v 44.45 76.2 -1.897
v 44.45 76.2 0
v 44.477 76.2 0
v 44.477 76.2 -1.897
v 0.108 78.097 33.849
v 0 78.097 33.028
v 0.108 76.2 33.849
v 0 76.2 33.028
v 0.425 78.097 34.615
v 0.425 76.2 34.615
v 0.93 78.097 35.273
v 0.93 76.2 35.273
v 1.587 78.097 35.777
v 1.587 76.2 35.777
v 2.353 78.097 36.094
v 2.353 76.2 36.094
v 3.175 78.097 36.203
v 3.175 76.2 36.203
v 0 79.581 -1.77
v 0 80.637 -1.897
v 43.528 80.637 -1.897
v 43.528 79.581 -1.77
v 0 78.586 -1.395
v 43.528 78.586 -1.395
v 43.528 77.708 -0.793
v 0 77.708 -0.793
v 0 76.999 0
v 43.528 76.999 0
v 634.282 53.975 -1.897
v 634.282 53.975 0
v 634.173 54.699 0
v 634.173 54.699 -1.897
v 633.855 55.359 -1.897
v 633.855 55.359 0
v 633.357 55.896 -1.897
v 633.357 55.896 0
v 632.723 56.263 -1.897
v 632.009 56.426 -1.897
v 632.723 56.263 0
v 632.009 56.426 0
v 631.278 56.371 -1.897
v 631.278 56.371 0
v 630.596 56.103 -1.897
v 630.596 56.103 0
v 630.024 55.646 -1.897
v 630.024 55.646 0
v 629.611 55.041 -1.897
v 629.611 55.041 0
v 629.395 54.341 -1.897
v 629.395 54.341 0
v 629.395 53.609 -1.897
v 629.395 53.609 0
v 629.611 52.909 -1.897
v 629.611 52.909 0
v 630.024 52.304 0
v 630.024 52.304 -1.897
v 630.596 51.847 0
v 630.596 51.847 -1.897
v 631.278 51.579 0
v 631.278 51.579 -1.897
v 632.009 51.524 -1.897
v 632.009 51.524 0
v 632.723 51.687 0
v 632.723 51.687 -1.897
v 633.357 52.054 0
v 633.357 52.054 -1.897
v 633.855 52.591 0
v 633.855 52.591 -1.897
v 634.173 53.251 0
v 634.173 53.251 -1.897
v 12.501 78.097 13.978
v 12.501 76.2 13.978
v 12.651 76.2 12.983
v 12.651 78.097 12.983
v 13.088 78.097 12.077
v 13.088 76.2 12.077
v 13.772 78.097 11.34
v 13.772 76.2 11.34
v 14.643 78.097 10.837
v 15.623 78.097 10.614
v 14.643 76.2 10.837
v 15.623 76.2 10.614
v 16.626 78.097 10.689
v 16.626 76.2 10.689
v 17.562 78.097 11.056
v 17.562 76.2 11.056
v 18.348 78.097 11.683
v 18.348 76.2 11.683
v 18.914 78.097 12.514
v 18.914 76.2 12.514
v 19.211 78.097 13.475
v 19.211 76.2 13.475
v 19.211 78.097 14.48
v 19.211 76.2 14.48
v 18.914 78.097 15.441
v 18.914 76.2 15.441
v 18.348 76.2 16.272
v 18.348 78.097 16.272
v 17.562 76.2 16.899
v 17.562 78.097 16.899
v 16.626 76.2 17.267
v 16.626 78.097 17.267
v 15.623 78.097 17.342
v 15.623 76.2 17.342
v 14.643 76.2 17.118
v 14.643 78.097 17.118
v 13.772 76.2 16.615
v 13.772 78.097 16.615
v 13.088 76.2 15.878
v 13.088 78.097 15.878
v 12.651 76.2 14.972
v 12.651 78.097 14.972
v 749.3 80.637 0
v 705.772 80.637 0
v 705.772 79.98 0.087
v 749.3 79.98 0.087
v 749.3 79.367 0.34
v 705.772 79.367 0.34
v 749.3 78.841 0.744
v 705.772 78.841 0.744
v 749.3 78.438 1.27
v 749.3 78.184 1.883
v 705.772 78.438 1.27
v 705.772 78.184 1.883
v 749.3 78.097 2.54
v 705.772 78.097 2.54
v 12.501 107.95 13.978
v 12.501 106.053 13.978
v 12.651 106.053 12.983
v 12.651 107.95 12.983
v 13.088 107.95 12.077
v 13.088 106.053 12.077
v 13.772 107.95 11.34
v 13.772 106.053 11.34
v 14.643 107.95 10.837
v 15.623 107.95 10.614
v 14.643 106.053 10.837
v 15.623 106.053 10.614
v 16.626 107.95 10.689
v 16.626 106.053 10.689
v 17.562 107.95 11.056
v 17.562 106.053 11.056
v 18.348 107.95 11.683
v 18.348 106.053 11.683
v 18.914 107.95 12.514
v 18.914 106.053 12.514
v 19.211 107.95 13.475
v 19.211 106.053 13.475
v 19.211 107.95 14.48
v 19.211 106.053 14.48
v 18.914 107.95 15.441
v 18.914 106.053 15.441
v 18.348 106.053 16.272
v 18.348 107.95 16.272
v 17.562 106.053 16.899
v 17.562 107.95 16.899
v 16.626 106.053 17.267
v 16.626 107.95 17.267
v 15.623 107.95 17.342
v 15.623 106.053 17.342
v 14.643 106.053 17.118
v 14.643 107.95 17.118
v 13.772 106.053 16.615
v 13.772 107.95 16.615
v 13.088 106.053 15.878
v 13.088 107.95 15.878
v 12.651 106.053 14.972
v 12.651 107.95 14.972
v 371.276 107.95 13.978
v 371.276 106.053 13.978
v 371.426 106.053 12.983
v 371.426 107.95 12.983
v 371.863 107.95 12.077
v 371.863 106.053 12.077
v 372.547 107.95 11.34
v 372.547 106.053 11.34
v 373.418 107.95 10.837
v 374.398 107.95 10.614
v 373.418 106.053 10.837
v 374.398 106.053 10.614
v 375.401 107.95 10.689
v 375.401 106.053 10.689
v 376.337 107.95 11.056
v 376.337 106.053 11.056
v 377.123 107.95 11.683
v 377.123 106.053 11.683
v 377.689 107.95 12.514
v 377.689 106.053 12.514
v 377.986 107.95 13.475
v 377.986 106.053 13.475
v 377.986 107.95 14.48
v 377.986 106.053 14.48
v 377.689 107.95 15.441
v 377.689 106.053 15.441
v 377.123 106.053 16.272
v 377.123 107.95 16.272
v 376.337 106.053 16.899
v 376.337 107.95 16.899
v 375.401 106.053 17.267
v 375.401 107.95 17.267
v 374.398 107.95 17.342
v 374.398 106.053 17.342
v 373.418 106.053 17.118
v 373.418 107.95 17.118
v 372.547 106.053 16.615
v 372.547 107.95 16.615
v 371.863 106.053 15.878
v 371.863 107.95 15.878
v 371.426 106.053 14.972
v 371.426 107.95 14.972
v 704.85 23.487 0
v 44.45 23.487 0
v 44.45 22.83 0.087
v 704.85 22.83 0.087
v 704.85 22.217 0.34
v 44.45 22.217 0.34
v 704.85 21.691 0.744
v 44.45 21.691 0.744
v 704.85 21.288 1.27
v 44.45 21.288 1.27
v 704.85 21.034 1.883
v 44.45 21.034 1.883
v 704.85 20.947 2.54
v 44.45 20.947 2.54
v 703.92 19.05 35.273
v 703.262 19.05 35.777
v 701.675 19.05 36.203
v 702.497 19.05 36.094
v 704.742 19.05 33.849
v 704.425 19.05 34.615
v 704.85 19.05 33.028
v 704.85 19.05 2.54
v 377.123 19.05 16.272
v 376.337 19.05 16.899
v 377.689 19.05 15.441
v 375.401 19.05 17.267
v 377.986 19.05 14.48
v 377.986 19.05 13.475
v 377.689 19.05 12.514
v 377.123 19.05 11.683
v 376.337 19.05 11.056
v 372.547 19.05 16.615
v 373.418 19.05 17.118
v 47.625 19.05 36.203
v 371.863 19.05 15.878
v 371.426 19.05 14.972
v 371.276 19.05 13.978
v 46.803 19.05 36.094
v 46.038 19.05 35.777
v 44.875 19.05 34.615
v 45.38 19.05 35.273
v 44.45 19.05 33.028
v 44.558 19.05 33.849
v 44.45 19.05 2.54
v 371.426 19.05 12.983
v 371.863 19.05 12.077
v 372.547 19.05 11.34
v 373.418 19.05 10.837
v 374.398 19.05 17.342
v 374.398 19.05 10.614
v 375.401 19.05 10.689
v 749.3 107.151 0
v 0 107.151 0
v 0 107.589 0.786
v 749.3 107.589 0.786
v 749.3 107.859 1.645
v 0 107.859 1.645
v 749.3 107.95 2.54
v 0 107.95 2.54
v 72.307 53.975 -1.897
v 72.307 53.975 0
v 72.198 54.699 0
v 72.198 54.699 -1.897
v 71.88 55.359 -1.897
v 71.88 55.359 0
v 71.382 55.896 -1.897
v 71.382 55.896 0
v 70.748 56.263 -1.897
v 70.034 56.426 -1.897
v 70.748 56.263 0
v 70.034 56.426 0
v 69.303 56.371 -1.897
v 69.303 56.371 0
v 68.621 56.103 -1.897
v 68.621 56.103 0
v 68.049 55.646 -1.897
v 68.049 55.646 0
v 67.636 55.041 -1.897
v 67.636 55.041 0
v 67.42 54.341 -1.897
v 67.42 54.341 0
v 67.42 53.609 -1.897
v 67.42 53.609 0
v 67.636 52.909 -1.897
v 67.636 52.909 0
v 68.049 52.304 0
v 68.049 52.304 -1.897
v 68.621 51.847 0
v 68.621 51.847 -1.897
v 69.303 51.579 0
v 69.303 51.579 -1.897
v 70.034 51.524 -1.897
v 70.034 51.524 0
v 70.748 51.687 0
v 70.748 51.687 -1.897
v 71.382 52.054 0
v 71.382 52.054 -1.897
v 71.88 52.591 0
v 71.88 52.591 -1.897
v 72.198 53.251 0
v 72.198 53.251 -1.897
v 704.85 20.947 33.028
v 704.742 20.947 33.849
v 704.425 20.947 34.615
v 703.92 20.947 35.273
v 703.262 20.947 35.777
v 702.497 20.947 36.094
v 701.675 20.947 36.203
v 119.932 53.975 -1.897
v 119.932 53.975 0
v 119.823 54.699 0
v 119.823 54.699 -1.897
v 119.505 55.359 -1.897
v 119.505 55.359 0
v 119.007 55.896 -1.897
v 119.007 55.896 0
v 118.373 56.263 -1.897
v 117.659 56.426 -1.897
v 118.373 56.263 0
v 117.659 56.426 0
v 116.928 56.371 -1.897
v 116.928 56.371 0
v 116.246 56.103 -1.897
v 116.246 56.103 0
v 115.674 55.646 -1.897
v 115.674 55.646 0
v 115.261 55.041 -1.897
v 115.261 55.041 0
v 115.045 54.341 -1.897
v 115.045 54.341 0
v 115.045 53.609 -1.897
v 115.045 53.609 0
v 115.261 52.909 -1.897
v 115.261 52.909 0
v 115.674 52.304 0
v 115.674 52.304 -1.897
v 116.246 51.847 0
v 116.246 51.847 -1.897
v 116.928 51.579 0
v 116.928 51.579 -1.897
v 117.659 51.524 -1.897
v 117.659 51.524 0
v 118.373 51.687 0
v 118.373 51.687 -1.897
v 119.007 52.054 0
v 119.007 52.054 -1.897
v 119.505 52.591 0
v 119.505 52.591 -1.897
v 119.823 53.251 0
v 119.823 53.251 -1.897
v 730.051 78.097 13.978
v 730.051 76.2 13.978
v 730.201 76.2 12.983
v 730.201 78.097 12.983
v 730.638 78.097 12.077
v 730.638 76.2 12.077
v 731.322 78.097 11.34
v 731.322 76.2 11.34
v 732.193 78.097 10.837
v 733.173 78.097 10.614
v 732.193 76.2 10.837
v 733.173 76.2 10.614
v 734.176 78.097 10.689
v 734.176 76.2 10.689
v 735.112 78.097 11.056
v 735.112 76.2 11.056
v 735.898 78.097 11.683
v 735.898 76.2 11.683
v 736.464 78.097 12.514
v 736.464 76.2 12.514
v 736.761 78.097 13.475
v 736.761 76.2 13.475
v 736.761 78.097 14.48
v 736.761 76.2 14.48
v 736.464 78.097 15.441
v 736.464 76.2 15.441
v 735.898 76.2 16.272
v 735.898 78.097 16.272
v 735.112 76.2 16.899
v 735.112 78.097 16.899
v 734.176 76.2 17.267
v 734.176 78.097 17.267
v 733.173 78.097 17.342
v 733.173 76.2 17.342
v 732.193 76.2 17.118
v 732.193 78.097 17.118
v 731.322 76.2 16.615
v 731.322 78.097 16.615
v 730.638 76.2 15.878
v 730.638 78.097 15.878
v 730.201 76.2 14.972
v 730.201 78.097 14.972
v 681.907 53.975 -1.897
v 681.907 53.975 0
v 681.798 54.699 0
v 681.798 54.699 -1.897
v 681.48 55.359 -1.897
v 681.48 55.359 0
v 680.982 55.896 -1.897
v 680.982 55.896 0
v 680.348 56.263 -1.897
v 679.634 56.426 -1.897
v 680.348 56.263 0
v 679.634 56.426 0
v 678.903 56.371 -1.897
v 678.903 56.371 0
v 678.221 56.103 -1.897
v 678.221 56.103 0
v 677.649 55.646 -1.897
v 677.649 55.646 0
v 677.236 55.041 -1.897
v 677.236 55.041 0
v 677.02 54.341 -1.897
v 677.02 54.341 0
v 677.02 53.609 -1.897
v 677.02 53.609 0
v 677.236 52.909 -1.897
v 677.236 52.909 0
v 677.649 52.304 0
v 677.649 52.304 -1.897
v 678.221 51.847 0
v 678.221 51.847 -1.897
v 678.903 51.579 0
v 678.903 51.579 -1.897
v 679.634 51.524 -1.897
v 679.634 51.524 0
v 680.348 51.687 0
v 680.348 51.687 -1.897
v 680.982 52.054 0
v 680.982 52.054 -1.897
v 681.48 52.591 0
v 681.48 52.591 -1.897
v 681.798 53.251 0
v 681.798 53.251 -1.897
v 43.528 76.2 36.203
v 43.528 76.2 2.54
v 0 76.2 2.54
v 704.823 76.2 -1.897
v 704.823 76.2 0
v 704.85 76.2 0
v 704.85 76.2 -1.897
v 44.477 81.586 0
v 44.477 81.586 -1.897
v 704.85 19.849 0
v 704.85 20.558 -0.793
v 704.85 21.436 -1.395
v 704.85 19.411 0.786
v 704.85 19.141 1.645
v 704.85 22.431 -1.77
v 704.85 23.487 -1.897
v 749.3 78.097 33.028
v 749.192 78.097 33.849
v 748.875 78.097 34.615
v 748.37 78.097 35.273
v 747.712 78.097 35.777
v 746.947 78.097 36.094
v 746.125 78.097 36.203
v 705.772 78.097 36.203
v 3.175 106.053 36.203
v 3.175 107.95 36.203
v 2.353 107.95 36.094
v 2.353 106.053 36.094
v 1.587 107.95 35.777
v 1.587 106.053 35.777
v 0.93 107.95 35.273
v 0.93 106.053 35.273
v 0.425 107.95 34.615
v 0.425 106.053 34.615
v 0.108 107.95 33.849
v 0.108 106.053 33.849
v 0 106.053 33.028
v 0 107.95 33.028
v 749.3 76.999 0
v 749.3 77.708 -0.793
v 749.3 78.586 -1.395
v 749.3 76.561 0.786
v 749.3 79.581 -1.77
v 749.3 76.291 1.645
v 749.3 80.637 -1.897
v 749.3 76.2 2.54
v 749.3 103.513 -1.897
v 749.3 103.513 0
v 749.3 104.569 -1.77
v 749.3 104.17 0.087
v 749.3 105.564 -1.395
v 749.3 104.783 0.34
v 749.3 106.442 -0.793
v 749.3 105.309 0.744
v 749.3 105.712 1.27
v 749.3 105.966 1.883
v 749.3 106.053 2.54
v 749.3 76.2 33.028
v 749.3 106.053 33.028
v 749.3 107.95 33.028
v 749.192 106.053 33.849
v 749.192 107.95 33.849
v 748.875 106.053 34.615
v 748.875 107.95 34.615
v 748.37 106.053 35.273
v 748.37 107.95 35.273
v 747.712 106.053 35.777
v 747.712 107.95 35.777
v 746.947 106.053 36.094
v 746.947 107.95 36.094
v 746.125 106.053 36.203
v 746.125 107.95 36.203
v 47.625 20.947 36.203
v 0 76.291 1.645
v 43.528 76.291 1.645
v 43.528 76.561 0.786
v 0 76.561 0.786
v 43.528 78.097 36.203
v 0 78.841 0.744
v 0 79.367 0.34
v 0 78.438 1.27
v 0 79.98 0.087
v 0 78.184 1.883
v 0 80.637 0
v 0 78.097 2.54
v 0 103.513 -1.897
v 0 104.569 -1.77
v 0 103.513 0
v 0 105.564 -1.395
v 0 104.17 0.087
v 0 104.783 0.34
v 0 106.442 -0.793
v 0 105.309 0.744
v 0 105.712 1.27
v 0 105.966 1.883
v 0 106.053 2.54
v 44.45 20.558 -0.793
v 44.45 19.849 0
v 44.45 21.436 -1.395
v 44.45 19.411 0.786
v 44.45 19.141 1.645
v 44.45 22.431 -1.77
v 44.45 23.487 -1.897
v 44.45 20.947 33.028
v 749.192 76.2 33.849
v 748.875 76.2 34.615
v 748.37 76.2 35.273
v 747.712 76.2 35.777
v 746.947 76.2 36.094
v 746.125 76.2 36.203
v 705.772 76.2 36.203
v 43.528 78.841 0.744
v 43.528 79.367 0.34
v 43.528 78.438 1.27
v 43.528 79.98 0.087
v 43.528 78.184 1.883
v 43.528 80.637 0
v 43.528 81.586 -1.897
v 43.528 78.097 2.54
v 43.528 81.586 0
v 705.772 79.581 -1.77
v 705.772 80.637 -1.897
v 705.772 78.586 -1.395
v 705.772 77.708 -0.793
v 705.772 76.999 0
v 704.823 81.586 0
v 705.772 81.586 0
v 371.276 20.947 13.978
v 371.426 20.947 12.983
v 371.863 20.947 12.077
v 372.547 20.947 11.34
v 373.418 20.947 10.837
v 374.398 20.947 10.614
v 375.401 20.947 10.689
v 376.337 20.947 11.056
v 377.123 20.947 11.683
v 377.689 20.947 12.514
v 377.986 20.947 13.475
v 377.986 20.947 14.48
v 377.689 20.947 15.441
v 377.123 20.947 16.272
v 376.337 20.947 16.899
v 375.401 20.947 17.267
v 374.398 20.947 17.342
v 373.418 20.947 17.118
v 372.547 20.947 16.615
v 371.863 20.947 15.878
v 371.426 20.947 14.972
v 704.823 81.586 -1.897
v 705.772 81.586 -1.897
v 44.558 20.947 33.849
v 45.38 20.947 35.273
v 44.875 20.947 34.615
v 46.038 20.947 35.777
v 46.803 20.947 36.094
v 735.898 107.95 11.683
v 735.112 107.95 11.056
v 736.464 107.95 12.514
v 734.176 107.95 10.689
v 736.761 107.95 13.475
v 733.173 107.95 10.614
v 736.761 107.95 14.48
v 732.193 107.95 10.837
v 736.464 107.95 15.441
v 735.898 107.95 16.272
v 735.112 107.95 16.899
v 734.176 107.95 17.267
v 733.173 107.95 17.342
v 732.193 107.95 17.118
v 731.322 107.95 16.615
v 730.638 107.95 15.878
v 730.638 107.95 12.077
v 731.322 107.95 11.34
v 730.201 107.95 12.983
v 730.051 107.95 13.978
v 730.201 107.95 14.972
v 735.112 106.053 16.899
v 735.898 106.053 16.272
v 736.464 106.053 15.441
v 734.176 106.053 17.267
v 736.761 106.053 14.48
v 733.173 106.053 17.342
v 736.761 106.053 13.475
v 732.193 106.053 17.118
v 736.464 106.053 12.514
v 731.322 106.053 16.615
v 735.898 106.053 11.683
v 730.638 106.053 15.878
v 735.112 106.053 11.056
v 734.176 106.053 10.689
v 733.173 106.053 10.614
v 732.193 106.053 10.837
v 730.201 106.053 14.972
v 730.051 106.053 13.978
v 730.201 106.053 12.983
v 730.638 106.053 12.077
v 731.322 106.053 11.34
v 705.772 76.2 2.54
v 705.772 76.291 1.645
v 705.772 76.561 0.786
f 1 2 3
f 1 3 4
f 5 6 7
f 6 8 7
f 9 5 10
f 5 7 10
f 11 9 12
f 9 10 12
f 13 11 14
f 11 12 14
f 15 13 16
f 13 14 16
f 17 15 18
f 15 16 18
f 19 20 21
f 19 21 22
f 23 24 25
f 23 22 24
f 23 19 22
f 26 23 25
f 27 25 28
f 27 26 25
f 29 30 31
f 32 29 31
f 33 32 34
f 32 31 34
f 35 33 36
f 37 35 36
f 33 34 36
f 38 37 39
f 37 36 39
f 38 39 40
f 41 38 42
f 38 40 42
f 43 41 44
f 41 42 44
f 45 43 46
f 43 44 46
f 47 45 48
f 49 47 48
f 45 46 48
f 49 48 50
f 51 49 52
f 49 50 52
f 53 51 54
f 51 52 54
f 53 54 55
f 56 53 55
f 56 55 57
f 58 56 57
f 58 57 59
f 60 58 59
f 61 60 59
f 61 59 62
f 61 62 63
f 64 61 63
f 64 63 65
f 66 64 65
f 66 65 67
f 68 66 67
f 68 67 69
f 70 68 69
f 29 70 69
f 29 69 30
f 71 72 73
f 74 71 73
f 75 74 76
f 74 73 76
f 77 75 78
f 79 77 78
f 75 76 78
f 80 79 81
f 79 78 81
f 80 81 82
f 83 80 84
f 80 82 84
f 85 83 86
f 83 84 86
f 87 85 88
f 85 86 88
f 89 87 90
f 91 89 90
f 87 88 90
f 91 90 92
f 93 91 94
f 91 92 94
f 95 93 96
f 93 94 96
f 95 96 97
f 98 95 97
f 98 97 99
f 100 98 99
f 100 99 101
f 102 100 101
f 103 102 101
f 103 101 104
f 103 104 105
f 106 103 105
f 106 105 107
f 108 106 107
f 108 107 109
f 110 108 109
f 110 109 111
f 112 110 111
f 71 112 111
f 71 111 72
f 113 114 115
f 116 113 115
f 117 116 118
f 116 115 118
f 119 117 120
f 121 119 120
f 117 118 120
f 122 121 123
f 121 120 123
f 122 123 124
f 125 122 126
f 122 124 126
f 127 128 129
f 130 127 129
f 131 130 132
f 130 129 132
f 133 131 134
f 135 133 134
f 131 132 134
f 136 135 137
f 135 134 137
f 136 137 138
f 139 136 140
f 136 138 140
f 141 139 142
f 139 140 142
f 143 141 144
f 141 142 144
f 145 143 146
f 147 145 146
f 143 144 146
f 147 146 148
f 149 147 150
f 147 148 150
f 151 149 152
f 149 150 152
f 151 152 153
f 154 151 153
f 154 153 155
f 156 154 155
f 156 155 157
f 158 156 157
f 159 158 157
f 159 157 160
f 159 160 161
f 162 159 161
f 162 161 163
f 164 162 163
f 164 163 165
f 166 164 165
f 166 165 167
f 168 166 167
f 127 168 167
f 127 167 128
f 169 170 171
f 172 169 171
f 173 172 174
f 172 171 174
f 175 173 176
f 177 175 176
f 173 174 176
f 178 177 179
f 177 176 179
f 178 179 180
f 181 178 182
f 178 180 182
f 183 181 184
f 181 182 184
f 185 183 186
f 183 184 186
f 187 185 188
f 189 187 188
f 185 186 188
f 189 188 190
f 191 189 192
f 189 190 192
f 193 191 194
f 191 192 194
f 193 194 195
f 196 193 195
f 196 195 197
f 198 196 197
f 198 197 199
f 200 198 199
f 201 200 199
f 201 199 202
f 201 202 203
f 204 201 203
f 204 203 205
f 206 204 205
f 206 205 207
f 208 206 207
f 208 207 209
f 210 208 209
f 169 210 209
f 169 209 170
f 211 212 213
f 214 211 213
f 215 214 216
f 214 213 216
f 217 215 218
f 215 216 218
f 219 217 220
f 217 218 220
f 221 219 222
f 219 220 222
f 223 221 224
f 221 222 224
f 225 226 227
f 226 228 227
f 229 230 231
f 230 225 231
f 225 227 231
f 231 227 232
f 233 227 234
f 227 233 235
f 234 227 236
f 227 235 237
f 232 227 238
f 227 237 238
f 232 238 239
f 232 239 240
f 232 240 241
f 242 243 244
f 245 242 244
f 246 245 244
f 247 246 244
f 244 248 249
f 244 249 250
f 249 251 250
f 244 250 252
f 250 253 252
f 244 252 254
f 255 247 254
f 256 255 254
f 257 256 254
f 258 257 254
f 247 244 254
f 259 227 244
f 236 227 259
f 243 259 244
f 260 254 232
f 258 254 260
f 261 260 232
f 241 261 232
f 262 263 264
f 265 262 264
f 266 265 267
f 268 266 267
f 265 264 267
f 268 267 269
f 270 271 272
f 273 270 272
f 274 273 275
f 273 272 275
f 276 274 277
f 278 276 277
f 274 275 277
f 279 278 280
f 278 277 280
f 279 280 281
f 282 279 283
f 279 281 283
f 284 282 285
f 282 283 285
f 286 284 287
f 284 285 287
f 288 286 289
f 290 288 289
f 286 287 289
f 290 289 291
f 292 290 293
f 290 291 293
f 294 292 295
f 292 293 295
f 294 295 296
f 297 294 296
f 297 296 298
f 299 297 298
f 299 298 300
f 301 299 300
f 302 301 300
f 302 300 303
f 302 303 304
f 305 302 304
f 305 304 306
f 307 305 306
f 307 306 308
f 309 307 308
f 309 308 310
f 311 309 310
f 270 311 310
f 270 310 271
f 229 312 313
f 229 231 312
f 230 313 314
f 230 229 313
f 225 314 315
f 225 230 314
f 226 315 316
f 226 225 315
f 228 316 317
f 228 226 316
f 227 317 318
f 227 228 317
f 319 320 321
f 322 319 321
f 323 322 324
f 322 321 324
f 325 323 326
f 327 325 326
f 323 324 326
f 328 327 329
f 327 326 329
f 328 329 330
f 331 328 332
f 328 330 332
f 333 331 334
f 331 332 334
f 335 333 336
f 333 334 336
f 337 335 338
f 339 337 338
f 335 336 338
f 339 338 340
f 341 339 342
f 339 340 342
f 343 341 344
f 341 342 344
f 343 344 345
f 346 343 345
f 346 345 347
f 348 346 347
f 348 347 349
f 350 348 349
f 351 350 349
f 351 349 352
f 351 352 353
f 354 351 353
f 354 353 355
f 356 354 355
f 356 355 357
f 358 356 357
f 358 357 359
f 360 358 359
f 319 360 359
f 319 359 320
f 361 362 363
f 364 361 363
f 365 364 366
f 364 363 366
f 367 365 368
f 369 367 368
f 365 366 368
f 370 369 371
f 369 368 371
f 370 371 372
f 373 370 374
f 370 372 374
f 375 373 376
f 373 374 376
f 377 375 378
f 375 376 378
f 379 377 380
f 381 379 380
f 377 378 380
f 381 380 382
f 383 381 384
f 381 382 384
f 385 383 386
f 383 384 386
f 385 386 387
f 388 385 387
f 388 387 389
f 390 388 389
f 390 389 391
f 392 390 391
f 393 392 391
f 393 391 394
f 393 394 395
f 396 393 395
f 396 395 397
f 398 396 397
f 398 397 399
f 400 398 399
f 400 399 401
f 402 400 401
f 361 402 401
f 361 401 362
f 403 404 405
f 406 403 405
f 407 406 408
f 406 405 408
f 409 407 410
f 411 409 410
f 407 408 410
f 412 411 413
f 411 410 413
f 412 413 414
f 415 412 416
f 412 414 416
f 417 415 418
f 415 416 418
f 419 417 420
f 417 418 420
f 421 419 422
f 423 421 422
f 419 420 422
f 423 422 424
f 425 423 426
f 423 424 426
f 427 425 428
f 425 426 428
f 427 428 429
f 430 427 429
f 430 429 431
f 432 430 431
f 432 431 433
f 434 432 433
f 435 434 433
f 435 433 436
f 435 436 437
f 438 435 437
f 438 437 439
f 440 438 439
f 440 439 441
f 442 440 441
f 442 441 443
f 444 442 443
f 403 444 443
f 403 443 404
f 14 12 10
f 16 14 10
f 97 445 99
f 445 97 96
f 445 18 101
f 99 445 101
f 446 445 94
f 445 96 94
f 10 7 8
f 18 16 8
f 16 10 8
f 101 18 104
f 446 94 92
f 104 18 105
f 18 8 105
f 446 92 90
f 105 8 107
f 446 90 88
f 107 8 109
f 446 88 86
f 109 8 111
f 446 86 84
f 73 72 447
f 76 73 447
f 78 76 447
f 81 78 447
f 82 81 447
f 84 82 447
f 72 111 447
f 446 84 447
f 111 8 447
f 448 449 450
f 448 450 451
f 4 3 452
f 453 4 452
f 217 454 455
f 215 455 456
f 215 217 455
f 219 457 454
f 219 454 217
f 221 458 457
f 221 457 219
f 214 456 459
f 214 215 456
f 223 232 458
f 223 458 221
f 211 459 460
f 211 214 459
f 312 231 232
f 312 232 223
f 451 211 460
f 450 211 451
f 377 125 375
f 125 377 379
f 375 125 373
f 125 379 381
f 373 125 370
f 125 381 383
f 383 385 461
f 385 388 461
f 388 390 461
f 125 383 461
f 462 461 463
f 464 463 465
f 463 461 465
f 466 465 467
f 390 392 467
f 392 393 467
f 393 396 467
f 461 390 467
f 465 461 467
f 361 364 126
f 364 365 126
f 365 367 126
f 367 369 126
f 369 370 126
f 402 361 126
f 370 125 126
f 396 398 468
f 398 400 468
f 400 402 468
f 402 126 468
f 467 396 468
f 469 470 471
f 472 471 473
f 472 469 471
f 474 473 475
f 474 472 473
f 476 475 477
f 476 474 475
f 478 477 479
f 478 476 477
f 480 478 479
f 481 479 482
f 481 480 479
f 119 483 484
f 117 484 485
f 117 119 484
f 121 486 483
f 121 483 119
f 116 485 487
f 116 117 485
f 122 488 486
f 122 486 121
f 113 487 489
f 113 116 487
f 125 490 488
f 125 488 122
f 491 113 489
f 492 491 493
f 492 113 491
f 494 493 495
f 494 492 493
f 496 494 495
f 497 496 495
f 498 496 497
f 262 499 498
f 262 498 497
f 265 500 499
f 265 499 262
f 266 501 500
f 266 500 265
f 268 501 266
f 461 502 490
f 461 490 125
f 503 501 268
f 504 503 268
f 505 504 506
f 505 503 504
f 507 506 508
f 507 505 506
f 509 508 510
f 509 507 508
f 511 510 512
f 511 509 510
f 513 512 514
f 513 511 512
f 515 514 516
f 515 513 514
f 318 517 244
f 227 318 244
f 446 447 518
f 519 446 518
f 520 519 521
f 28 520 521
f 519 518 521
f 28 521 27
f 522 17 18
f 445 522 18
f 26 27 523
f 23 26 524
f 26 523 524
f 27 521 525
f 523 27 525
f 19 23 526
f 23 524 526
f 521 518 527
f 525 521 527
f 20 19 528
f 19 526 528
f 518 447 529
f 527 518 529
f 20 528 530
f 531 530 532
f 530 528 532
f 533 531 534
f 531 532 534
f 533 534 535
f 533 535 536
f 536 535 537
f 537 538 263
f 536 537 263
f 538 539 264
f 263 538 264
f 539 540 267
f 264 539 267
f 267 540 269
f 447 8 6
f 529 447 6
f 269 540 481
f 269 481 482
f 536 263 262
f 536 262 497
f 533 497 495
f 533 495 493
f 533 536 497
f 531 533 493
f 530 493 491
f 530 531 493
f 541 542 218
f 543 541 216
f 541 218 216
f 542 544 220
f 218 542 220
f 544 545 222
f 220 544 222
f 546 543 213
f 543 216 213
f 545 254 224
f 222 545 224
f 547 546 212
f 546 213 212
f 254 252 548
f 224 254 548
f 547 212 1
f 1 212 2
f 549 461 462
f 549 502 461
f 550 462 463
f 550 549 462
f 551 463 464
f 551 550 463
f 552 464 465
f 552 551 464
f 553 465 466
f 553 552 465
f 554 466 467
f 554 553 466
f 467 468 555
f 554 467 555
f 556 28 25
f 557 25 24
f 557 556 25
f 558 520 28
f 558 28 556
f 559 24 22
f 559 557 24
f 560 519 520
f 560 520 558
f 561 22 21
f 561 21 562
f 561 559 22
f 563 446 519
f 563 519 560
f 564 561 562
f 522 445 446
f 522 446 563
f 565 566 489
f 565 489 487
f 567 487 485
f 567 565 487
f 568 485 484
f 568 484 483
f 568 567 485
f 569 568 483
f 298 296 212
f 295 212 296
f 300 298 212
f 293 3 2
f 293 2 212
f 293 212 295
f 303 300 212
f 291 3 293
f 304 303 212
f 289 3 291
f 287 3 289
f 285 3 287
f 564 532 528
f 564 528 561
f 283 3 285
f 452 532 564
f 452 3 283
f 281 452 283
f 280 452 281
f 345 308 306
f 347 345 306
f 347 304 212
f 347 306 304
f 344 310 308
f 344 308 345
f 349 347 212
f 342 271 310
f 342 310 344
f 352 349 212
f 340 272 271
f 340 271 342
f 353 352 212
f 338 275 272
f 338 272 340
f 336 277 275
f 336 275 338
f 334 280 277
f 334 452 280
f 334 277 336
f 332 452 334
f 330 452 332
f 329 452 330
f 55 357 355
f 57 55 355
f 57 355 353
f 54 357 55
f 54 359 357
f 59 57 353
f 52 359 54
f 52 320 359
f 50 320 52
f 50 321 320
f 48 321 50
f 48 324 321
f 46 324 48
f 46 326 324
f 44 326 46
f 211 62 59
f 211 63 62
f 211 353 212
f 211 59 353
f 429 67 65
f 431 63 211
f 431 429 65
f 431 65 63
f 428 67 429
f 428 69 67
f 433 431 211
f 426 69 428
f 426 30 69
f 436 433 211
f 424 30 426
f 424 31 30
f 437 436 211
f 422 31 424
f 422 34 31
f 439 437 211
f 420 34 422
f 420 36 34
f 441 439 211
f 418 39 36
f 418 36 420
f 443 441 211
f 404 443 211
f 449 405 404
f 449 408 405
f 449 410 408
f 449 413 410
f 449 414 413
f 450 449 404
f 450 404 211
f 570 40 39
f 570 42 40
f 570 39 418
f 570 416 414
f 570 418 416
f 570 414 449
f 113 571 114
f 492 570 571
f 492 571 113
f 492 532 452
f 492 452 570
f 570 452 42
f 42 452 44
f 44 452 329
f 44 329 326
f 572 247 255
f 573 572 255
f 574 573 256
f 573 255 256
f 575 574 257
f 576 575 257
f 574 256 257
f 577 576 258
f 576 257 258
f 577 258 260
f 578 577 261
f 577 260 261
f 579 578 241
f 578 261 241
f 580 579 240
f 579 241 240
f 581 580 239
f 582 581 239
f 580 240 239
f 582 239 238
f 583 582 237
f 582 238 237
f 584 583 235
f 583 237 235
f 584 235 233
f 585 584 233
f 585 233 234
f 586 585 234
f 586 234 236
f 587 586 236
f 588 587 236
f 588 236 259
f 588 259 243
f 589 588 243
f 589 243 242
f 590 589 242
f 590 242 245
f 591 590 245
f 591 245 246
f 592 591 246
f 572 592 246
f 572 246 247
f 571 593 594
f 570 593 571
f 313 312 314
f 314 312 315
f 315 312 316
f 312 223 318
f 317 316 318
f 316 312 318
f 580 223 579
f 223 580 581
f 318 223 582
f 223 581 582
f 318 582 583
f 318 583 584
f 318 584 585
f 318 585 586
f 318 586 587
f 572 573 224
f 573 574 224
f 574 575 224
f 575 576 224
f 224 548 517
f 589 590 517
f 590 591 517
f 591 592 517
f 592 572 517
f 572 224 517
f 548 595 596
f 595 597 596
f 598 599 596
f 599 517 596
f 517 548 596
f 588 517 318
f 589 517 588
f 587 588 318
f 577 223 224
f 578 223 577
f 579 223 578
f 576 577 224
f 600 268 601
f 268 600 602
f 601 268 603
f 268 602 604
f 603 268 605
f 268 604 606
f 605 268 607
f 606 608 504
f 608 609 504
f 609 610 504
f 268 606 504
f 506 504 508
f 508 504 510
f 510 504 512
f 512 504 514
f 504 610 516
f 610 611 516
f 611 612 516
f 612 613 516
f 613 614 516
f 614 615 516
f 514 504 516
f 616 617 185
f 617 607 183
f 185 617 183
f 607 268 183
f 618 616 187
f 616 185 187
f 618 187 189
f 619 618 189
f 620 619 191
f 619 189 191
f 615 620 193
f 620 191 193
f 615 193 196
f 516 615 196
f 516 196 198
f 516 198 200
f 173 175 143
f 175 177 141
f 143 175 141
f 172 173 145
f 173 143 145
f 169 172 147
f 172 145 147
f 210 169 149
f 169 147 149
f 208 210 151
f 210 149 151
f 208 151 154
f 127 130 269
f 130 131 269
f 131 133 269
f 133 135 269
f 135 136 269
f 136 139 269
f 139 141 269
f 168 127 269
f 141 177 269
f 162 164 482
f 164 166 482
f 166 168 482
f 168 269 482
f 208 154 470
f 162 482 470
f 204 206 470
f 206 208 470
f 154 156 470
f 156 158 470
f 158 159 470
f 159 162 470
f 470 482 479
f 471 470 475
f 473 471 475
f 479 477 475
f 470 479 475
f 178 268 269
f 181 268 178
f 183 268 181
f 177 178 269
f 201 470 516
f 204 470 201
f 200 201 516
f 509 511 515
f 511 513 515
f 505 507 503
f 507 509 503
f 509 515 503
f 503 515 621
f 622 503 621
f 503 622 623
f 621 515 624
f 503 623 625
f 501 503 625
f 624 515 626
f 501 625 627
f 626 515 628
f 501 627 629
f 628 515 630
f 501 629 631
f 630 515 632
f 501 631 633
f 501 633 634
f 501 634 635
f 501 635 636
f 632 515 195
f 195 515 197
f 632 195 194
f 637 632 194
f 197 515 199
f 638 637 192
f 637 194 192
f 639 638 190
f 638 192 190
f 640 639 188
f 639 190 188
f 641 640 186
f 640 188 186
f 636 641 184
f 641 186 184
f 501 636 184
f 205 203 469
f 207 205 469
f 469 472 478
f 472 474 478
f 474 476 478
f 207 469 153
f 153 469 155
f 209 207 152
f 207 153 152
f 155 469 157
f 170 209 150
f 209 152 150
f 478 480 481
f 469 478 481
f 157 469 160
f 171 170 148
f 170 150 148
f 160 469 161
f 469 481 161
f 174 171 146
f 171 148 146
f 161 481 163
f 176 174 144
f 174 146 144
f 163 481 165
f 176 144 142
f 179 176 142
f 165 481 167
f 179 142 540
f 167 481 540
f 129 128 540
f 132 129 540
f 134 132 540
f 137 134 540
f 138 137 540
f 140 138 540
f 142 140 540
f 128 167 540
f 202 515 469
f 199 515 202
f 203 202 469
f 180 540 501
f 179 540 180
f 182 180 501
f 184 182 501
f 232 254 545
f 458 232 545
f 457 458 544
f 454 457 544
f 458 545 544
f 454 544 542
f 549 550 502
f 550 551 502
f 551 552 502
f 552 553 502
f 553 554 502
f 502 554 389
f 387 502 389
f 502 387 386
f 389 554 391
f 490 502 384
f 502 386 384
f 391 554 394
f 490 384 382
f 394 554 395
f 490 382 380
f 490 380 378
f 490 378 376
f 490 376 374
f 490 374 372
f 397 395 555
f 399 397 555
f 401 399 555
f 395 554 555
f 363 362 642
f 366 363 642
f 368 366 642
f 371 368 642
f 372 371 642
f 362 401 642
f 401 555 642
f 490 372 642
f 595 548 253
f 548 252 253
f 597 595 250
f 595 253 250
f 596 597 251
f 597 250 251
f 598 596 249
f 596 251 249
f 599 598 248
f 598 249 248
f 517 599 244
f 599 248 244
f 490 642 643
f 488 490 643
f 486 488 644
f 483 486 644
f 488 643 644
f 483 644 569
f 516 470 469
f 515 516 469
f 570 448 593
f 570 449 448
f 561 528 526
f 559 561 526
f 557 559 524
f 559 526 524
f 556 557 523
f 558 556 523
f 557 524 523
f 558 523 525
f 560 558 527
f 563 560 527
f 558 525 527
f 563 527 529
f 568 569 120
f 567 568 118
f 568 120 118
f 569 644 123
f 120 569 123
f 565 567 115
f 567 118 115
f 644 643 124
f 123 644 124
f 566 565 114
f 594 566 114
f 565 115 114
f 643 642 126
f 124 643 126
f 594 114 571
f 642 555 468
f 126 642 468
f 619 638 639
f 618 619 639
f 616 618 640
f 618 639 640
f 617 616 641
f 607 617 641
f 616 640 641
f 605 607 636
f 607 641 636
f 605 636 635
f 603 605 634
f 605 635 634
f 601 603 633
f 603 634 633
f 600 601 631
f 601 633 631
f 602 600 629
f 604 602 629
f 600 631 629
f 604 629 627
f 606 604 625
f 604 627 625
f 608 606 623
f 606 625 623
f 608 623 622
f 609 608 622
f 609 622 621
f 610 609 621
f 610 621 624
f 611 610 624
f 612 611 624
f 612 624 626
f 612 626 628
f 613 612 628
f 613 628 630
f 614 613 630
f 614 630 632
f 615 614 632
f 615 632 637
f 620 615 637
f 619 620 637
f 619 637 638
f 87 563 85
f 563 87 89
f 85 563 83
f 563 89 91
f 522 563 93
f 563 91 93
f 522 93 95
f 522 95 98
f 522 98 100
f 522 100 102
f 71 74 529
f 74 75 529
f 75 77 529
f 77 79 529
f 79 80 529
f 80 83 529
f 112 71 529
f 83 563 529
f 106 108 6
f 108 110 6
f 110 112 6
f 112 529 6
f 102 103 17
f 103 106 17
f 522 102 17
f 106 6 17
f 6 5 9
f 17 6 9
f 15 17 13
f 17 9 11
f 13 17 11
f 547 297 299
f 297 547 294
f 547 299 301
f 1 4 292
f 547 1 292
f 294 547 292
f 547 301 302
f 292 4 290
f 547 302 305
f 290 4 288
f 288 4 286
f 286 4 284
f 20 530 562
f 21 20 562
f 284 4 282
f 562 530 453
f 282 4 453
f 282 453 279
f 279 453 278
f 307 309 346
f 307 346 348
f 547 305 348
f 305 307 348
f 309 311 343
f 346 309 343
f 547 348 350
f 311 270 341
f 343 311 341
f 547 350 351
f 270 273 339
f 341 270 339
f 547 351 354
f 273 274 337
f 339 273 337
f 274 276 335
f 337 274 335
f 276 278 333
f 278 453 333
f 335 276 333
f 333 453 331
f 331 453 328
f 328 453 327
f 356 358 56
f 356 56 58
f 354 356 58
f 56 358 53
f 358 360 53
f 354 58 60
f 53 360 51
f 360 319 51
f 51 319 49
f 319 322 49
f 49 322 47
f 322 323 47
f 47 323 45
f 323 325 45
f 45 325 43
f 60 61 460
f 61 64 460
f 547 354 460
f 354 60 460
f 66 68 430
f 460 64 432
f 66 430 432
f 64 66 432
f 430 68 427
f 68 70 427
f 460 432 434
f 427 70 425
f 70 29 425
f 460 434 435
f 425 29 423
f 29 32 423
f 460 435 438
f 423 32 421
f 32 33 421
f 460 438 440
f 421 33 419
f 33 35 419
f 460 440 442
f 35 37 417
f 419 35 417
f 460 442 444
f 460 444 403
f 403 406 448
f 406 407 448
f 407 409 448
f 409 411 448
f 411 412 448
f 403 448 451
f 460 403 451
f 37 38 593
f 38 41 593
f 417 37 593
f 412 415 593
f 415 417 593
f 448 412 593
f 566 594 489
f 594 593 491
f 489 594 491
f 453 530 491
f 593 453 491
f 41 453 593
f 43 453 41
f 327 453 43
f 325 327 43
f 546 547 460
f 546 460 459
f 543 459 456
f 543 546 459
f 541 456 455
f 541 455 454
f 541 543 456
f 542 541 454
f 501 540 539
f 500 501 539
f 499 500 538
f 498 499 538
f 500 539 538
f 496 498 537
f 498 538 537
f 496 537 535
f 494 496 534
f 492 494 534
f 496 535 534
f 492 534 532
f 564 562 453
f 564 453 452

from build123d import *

# Parameters (mm, degrees)
BASE_FLANGE1_DEPTH               = 1.89738
EDGE_FLANGE1_DEPTH               = 749.3
EDGE_FLANGE1_2_DEPTH             = 44.47667
EDGE_FLANGE1_START               = 704.82333
EDGE_FLANGE1_3_DEPTH             = 44.47667
EDGE_FLANGE1_START_2             = 43.52798
EDGE_FLANGE1_4_DEPTH             = 0.94869
EDGE_FLANGE1_5_DEPTH             = 0.94869
EDGE_FLANGE1_START_3             = 44.45
EDGE_FLANGE1_6_DEPTH             = 660.4
EDGE_FLANGE1_7_DEPTH             = 749.3
EDGE_FLANGE1_8_DEPTH             = 43.52798
EDGE_FLANGE1_START_4             = 705.77202
EDGE_FLANGE1_9_DEPTH             = 43.52798
FILLET1_R                        = 3.175
F_10_0_1935_DIAMETER_HOLE1_D     = 4.9149
F_17_64_0_26563_DIAMETER_HOLE2_D = 6.747002


# Read off the part's stored shape, not the designer's step: Edge-Flange1
# Sheet-metal steps are written as plain solids
with BuildPart() as part:
    # Sketch1 → Base-Flange1 (new body)
    with BuildSketch(Plane.XY):
        Polygon((44.45, 19.05), (704.85, 19.05), (704.85, 76.2), (749.3, 76.2), (749.3, 107.95), (0, 107.95), (0, 76.2), (44.45, 76.2), align=None)
    extrude(amount=-BASE_FLANGE1_DEPTH)

    # Edge-Flange1 outline → Edge-Flange1 (cut)
    with BuildSketch(Plane.YZ):
        with BuildLine():
            Line((19.05, -1.89738), (23.48738, -1.89738))
            ThreePointArc((23.48738, -1.89738), (21.435625133, -1.394544857), (19.84887189, 0))
            Line((19.84887189, 0), (19.05, 0))
            Line((19.05, 0), (19.05, -1.89738))
        make_face()
        with BuildLine():
            ThreePointArc((107.15112811, 0), (105.564374867, -1.394544857), (103.51262, -1.89738))
            Line((103.51262, -1.89738), (107.95, -1.89738))
            Line((107.95, -1.89738), (107.95, 0))
            Line((107.95, 0), (107.15112811, 0))
        make_face()
    extrude(amount=EDGE_FLANGE1_DEPTH, mode=Mode.SUBTRACT)

    # Edge-Flange1 2 outline → Edge-Flange1 2 (cut)
    with BuildSketch(Plane.YZ):
        with BuildLine():
            Line((76.2, 0), (76.2, -1.89738))
            Line((76.2, -1.89738), (80.63738, -1.89738))
            ThreePointArc((80.63738, -1.89738), (78.585625133, -1.394544857), (76.99887189, 0))
            Line((76.99887189, 0), (76.2, 0))
        make_face()
    extrude(amount=EDGE_FLANGE1_2_DEPTH, mode=Mode.SUBTRACT)

    # Edge-Flange1 3 outline → Edge-Flange1 3 (cut)
    with BuildSketch(Plane.YZ.offset(EDGE_FLANGE1_START)):
        with BuildLine():
            Line((76.2, 0), (76.2, -1.89738))
            Line((76.2, -1.89738), (80.63738, -1.89738))
            ThreePointArc((80.63738, -1.89738), (78.585625133, -1.394544857), (76.99887189, 0))
            Line((76.99887189, 0), (76.2, 0))
        make_face()
    extrude(amount=EDGE_FLANGE1_3_DEPTH, mode=Mode.SUBTRACT)

    # Edge-Flange1 4 outline → Edge-Flange1 4 (cut)
    with BuildSketch(Plane.YZ.offset(EDGE_FLANGE1_START_2)):
        with BuildLine():
            ThreePointArc((76.99887189, 0), (78.585625133, -1.394544857), (80.63738, -1.89738))
            Line((80.63738, -1.89738), (81.58607, -1.89738))
            Line((81.58607, -1.89738), (81.58607, 0))
            Line((81.58607, 0), (76.99887189, 0))
        make_face()
    extrude(amount=EDGE_FLANGE1_4_DEPTH, mode=Mode.SUBTRACT)

    # Edge-Flange1 5 outline → Edge-Flange1 5 (cut)
    with BuildSketch(Plane.YZ.offset(EDGE_FLANGE1_START)):
        with BuildLine():
            ThreePointArc((76.99887189, 0), (78.585625133, -1.394544857), (80.63738, -1.89738))
            Line((80.63738, -1.89738), (81.58607, -1.89738))
            Line((81.58607, -1.89738), (81.58607, 0))
            Line((81.58607, 0), (76.99887189, 0))
        make_face()
    extrude(amount=EDGE_FLANGE1_5_DEPTH, mode=Mode.SUBTRACT)

    # Edge-Flange1 6 outline → Edge-Flange1 6 (add)
    with BuildSketch(Plane.YZ.offset(EDGE_FLANGE1_START_3)):
        with BuildLine():
            Line((19.84887189, 0), (23.48738, 0))
            ThreePointArc((23.48738, 0), (21.691328776, 0.743948776), (20.94738, 2.54))
            Line((20.94738, 2.54), (20.94738, 36.20262))
            Line((20.94738, 36.20262), (19.05, 36.20262))
            Line((19.05, 36.20262), (19.05, 2.54))
            ThreePointArc((19.05, 2.54), (19.254426871, 1.20866643), (19.84887189, 0))
        make_face()
        with BuildLine():
            ThreePointArc((106.05262, 2.54), (105.308671224, 0.743948776), (103.51262, 0))
            Line((103.51262, 0), (107.15112811, 0))
            ThreePointArc((107.15112811, 0), (107.745573129, 1.20866643), (107.95, 2.54))
            Line((107.95, 2.54), (107.95, 36.20262))
            Line((107.95, 36.20262), (106.05262, 36.20262))
            Line((106.05262, 36.20262), (106.05262, 2.54))
        make_face()
    extrude(amount=EDGE_FLANGE1_6_DEPTH)

    # Edge-Flange1 7 outline → Edge-Flange1 7 (add)
    with BuildSketch(Plane.YZ):
        with BuildLine():
            ThreePointArc((106.05262, 2.54), (105.308671224, 0.743948776), (103.51262, 0))
            Line((103.51262, 0), (107.15112811, 0))
            ThreePointArc((107.15112811, 0), (107.745573129, 1.20866643), (107.95, 2.54))
            Line((107.95, 2.54), (107.95, 36.20262))
            Line((107.95, 36.20262), (106.05262, 36.20262))
            Line((106.05262, 36.20262), (106.05262, 2.54))
        make_face()
    extrude(amount=EDGE_FLANGE1_7_DEPTH)

    # Edge-Flange1 8 outline → Edge-Flange1 8 (add)
    with BuildSketch(Plane.YZ):
        with BuildLine():
            ThreePointArc((76.2, 2.54), (76.404426871, 1.20866643), (76.99887189, 0))
            Line((76.99887189, 0), (80.63738, 0))
            ThreePointArc((80.63738, 0), (78.841328776, 0.743948776), (78.09738, 2.54))
            Line((78.09738, 2.54), (78.09738, 36.20262))
            Line((78.09738, 36.20262), (76.2, 36.20262))
            Line((76.2, 36.20262), (76.2, 2.54))
        make_face()
    extrude(amount=EDGE_FLANGE1_8_DEPTH)

    # Edge-Flange1 9 outline → Edge-Flange1 9 (add)
    with BuildSketch(Plane.YZ.offset(EDGE_FLANGE1_START_4)):
        with BuildLine():
            ThreePointArc((76.2, 2.54), (76.404426871, 1.20866643), (76.99887189, 0))
            Line((76.99887189, 0), (80.63738, 0))
            ThreePointArc((80.63738, 0), (78.841328776, 0.743948776), (78.09738, 2.54))
            Line((78.09738, 2.54), (78.09738, 36.20262))
            Line((78.09738, 36.20262), (76.2, 36.20262))
            Line((76.2, 36.20262), (76.2, 2.54))
        make_face()
    extrude(amount=EDGE_FLANGE1_9_DEPTH)

    # Fillet1
    fillet1_edges = [part.edges().sort_by_distance(p)[0] for p in [
        (749.3, 107.00131, 36.20262),
        (0, 107.00131, 36.20262),
        (0, 77.14869, 36.20262),
        (44.45, 19.99869, 36.20262),
        (704.85, 19.99869, 36.20262),
        (749.3, 77.14869, 36.20262),
    ]]
    fillet(fillet1_edges, radius=FILLET1_R)

    # #10 (0.1935) Diameter Hole1 (through all)
    with Locations(Plane(origin=(0, 0, -1.89738), x_dir=(-1, 0, 0), z_dir=(0, 0, -1))):
        with Locations((-679.45, 53.975), (-631.825, 53.975), (-117.475, 53.975), (-69.85, 53.975)):
            Hole(F_10_0_1935_DIAMETER_HOLE1_D / 2)

    # 17/64 (0.26563) Diameter Hole2 (through all)
    with Locations(Plane(origin=(0, 107.95, 0), x_dir=(1, 0, 0), z_dir=(0, 1, 0))):
        with Locations((733.425, -13.97762), (374.65, -13.97762), (15.875, -13.97762)):
            Hole(F_17_64_0_26563_DIAMETER_HOLE2_D / 2)


solid = part.part
